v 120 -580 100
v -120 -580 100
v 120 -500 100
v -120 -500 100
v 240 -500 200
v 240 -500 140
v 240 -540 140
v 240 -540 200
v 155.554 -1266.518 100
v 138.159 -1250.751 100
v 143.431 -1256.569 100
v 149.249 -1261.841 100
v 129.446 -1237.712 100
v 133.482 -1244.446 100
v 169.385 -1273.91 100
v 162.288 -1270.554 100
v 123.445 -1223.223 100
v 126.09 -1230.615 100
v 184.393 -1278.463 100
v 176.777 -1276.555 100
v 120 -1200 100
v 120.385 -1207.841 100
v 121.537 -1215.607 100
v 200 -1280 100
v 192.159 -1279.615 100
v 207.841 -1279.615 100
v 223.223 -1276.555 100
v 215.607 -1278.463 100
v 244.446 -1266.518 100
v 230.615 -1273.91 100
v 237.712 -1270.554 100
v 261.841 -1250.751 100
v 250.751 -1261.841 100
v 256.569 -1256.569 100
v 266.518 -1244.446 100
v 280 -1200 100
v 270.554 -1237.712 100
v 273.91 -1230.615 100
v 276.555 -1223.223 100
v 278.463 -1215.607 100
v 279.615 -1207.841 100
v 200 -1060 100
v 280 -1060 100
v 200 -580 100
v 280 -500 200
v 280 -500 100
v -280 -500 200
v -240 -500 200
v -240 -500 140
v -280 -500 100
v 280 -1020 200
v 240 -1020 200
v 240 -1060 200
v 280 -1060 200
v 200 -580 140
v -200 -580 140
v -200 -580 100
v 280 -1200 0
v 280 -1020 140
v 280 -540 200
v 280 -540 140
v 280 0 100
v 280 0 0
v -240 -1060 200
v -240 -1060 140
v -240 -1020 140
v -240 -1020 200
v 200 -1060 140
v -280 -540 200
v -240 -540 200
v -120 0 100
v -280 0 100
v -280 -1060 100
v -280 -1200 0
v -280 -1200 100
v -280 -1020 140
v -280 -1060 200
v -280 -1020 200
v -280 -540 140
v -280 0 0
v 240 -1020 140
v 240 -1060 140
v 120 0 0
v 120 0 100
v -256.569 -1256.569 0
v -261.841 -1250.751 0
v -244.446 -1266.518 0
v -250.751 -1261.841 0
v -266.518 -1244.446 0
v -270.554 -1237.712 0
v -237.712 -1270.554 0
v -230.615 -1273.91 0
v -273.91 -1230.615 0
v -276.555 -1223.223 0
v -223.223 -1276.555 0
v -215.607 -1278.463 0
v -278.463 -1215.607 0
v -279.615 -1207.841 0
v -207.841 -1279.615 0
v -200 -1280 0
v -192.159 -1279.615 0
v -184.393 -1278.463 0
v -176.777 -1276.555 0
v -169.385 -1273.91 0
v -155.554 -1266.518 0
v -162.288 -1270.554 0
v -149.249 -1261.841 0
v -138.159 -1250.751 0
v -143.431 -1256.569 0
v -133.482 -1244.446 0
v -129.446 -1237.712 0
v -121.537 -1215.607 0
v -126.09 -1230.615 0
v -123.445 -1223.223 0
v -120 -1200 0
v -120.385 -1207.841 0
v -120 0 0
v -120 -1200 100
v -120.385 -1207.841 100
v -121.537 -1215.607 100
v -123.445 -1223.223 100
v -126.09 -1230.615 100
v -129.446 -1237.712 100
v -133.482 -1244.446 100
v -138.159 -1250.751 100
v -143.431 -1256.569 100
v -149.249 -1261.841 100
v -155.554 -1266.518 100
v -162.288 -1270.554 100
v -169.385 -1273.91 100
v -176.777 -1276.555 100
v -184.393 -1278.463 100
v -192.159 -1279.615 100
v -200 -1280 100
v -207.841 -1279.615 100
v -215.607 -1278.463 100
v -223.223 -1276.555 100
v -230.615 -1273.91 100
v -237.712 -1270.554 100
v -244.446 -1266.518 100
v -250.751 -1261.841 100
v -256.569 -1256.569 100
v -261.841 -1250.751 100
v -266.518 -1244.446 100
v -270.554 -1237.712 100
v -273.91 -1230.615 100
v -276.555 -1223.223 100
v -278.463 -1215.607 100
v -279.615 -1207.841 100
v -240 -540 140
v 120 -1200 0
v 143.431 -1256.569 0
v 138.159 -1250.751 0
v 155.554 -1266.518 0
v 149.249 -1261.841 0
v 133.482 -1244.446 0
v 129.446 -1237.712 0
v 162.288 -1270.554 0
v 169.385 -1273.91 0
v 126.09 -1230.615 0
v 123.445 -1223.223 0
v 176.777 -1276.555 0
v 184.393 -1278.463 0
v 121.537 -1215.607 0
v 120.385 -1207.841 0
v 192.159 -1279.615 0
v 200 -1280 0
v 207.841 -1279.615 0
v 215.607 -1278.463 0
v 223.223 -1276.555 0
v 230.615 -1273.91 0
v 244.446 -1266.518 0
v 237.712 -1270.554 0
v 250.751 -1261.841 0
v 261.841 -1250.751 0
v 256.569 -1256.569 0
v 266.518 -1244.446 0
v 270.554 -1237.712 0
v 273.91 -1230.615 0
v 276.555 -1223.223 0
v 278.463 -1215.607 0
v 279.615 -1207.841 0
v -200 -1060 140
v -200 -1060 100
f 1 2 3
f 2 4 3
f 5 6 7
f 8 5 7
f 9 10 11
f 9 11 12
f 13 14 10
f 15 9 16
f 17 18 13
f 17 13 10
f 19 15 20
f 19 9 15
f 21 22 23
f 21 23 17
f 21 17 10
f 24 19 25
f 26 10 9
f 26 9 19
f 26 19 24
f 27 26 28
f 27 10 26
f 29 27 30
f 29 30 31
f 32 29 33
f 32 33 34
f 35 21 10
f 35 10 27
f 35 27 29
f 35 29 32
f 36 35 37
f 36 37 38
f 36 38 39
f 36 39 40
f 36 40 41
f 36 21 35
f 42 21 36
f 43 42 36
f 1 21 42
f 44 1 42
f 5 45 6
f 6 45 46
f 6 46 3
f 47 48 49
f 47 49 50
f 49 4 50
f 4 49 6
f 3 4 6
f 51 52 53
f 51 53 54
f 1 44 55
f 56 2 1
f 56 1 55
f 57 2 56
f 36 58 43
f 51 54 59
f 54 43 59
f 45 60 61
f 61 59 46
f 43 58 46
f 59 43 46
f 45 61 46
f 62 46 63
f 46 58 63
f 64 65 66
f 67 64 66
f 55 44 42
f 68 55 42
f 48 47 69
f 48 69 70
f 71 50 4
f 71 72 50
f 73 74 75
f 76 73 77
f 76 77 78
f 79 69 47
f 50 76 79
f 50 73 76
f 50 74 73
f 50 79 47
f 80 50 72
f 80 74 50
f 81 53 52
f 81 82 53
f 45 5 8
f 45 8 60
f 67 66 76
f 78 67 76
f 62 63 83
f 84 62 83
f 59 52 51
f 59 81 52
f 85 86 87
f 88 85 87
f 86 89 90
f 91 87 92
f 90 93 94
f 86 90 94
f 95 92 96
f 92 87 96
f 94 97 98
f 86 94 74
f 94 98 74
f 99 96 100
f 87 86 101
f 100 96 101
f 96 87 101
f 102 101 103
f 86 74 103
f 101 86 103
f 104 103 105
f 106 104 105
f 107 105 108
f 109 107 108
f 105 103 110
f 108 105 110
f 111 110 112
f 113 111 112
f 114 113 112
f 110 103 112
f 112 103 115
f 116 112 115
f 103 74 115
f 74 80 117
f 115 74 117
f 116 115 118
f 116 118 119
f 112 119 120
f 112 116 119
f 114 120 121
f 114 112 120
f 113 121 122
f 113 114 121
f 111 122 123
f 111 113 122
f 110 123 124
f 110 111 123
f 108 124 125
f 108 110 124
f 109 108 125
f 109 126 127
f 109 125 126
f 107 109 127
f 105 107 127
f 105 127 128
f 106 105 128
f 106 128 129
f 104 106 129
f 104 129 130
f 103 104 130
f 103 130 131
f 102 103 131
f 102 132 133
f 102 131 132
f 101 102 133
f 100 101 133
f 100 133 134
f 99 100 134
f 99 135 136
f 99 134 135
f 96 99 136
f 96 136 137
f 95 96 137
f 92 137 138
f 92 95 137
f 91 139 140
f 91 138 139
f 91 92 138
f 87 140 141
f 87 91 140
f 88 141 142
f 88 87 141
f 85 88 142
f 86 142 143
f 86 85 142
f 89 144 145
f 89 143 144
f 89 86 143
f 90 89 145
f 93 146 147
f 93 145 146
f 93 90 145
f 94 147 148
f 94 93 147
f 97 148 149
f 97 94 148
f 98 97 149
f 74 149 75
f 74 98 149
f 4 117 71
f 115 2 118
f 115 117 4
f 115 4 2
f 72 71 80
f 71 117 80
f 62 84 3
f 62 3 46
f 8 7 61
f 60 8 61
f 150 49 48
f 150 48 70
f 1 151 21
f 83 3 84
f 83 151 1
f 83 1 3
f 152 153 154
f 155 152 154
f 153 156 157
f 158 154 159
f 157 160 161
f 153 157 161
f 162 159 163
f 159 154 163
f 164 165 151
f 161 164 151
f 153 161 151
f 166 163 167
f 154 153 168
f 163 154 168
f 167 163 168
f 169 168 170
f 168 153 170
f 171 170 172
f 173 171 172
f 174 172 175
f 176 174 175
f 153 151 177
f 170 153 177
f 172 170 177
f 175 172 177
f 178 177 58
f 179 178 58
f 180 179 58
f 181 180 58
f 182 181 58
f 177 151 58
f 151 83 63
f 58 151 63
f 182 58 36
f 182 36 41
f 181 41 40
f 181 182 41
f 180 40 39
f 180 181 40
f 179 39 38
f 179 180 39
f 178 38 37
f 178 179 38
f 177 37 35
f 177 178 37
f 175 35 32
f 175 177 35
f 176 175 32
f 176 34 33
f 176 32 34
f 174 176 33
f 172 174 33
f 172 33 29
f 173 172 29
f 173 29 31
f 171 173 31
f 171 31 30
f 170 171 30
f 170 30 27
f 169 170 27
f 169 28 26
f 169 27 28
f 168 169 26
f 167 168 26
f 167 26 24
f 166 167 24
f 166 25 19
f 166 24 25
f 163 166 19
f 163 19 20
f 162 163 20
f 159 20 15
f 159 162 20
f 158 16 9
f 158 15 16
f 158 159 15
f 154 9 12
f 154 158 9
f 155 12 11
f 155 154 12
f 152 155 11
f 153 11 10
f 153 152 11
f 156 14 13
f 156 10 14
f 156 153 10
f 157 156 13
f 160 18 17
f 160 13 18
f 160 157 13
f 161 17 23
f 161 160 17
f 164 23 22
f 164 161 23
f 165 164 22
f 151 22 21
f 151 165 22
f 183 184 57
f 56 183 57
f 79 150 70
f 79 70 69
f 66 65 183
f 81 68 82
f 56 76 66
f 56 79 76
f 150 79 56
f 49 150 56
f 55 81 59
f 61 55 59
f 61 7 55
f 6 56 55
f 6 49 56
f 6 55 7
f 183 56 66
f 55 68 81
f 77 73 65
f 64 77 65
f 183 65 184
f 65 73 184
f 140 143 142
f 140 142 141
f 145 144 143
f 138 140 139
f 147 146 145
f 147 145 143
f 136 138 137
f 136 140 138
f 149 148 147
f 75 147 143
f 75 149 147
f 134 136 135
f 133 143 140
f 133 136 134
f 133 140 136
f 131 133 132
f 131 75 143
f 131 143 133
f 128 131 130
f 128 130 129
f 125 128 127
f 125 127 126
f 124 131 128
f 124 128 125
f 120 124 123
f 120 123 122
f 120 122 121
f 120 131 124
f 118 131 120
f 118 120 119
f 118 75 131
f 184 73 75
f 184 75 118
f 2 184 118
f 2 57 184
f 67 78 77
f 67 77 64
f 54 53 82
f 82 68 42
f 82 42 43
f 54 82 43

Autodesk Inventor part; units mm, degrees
ref_plane "YZ Plane" through (0, 0, 0) normal (1, 0, 0) x (0, 1, 0)
ref_plane "XZ Plane" through (0, 0, 0) normal (0, 1, 0) x (-1, 0, 0)
ref_plane "XY Plane" through (0, 0, 0) normal (0, 0, 1) x (1, 0, 0)
sketch "Sketch1" plane through (0, 0, 0) normal (0, 0, 1) x (1, 0, 0)
  line L0 (280, 0) -> (280, -1200)
  arc A0 (120, -1200) -> (280, -1200) centre (200, -1200) ccw
  line L1 (120, -1200) -> (120, 0)
  line L2 (-120, 0) -> (-120, -1200)
  arc A1 (-280, -1200) -> (-120, -1200) centre (-200, -1200) ccw
  line L3 (-280, -1200) -> (-280, 0)
  line L4 (280, 0) -> (-280, 0)
  line L5 (0, 0) -> (0, -1425.5319) construction
  dimension "d0" = 160
  dimension "d1" = 560
  dimension "d2" = 1200
extrude "Extrusion1" add sketch "Sketch1" along normal blind 100
sketch "Sketch2" plane through (0, 0, 100) normal (0, 0, 1) x (1, 0, 0)
  arc A0 (-280, -1200) -> (-120, -1200) centre (-200, -1200) ccw projected
  line L0 (-120, -1200) -> (-120, 0) projected
  line L1 (-120, 0) -> (-280, 0) projected
  line L2 (-280, 0) -> (-280, -1200) projected
  line L3 (280, 0) -> (120, 0) projected
  line L4 (120, 0) -> (120, -1200) projected
  arc A1 (120, -1200) -> (280, -1200) centre (200, -1200) ccw projected
  line L5 (280, -1200) -> (280, 0) projected
  line L6 (-280, -1060) -> (-200, -1060)
  line L7 (-200, -1060) -> (-200, -500)
  line L8 (-200, -500) -> (-280, -500)
  line L9 (-280, -500) -> (-280, -1060)
  line L10 (200, -1060) -> (280, -1060)
  line L11 (280, -1060) -> (280, -500)
  line L12 (280, -500) -> (200, -500)
  line L13 (200, -500) -> (200, -1060)
  line L14 (-200, -500) -> (200, -500)
  line L15 (200, -500) -> (200, -580)
  line L16 (200, -580) -> (-200, -580)
  line L17 (-200, -580) -> (-200, -500)
  line L18 (-280, 0) -> (-280, -1200) projected
  line L19 (280, -1200) -> (280, 0) projected
  point P0 (0, 0)
  point P1 (-200, -580)
  dimension "d5" = 80
  dimension "d6" = 560
  dimension "d7" = 560
  dimension "d8" = 400
  dimension "d9" = 500
extrude "Extrusion2" add sketch "Sketch2" along normal blind 40 contours L2 L8 L7 L6 | L16 L7 L14 L0 | L0 L14 L4 L16 | L4 L14 L13 L16 | L13 L12 L5 L10
sketch "Sketch3" plane through (0, 0, 140) normal (0, 0, 1) x (1, 0, 0)
  line L0 (-280, -500) -> (-280, -1060) projected
  line L1 (-280, -1060) -> (-200, -1060) projected
  line L2 (-200, -1060) -> (-200, -580) projected
  line L3 (-200, -580) -> (200, -580) projected
  line L4 (200, -580) -> (200, -1060) projected
  line L5 (200, -1060) -> (280, -1060) projected
  line L6 (280, -1060) -> (280, -500) projected
  line L7 (280, -500) -> (-280, -500) projected
  line L8 (-280, -1060) -> (-240, -1060)
  line L9 (-240, -1060) -> (-240, -1020)
  line L10 (-240, -1020) -> (-280, -1020)
  line L11 (-280, -1020) -> (-280, -1060)
  line L12 (-280, -500) -> (-240, -500)
  line L13 (-240, -500) -> (-240, -540)
  line L14 (-240, -540) -> (-280, -540)
  line L15 (-280, -540) -> (-280, -500)
  line L16 (280, -500) -> (240, -500)
  line L17 (240, -500) -> (240, -540)
  line L18 (240, -540) -> (280, -540)
  line L19 (280, -540) -> (280, -500)
  line L20 (280, -1060) -> (240, -1060)
  line L21 (240, -1060) -> (240, -1020)
  line L22 (240, -1020) -> (280, -1020)
  line L23 (280, -1020) -> (280, -1060)
  point P0 (0, 0)
  dimension "d12" = 40
extrude "Extrusion3" add sketch "Sketch3" along normal blind 60 contours L7 L13 L14 L0 | L10 L9 L1 L0 | L7 L6 L18 L17 | L6 L5 L21 L22
equation "\"d7\" = d6"
properties part number "pallet jack dummy_1200"
